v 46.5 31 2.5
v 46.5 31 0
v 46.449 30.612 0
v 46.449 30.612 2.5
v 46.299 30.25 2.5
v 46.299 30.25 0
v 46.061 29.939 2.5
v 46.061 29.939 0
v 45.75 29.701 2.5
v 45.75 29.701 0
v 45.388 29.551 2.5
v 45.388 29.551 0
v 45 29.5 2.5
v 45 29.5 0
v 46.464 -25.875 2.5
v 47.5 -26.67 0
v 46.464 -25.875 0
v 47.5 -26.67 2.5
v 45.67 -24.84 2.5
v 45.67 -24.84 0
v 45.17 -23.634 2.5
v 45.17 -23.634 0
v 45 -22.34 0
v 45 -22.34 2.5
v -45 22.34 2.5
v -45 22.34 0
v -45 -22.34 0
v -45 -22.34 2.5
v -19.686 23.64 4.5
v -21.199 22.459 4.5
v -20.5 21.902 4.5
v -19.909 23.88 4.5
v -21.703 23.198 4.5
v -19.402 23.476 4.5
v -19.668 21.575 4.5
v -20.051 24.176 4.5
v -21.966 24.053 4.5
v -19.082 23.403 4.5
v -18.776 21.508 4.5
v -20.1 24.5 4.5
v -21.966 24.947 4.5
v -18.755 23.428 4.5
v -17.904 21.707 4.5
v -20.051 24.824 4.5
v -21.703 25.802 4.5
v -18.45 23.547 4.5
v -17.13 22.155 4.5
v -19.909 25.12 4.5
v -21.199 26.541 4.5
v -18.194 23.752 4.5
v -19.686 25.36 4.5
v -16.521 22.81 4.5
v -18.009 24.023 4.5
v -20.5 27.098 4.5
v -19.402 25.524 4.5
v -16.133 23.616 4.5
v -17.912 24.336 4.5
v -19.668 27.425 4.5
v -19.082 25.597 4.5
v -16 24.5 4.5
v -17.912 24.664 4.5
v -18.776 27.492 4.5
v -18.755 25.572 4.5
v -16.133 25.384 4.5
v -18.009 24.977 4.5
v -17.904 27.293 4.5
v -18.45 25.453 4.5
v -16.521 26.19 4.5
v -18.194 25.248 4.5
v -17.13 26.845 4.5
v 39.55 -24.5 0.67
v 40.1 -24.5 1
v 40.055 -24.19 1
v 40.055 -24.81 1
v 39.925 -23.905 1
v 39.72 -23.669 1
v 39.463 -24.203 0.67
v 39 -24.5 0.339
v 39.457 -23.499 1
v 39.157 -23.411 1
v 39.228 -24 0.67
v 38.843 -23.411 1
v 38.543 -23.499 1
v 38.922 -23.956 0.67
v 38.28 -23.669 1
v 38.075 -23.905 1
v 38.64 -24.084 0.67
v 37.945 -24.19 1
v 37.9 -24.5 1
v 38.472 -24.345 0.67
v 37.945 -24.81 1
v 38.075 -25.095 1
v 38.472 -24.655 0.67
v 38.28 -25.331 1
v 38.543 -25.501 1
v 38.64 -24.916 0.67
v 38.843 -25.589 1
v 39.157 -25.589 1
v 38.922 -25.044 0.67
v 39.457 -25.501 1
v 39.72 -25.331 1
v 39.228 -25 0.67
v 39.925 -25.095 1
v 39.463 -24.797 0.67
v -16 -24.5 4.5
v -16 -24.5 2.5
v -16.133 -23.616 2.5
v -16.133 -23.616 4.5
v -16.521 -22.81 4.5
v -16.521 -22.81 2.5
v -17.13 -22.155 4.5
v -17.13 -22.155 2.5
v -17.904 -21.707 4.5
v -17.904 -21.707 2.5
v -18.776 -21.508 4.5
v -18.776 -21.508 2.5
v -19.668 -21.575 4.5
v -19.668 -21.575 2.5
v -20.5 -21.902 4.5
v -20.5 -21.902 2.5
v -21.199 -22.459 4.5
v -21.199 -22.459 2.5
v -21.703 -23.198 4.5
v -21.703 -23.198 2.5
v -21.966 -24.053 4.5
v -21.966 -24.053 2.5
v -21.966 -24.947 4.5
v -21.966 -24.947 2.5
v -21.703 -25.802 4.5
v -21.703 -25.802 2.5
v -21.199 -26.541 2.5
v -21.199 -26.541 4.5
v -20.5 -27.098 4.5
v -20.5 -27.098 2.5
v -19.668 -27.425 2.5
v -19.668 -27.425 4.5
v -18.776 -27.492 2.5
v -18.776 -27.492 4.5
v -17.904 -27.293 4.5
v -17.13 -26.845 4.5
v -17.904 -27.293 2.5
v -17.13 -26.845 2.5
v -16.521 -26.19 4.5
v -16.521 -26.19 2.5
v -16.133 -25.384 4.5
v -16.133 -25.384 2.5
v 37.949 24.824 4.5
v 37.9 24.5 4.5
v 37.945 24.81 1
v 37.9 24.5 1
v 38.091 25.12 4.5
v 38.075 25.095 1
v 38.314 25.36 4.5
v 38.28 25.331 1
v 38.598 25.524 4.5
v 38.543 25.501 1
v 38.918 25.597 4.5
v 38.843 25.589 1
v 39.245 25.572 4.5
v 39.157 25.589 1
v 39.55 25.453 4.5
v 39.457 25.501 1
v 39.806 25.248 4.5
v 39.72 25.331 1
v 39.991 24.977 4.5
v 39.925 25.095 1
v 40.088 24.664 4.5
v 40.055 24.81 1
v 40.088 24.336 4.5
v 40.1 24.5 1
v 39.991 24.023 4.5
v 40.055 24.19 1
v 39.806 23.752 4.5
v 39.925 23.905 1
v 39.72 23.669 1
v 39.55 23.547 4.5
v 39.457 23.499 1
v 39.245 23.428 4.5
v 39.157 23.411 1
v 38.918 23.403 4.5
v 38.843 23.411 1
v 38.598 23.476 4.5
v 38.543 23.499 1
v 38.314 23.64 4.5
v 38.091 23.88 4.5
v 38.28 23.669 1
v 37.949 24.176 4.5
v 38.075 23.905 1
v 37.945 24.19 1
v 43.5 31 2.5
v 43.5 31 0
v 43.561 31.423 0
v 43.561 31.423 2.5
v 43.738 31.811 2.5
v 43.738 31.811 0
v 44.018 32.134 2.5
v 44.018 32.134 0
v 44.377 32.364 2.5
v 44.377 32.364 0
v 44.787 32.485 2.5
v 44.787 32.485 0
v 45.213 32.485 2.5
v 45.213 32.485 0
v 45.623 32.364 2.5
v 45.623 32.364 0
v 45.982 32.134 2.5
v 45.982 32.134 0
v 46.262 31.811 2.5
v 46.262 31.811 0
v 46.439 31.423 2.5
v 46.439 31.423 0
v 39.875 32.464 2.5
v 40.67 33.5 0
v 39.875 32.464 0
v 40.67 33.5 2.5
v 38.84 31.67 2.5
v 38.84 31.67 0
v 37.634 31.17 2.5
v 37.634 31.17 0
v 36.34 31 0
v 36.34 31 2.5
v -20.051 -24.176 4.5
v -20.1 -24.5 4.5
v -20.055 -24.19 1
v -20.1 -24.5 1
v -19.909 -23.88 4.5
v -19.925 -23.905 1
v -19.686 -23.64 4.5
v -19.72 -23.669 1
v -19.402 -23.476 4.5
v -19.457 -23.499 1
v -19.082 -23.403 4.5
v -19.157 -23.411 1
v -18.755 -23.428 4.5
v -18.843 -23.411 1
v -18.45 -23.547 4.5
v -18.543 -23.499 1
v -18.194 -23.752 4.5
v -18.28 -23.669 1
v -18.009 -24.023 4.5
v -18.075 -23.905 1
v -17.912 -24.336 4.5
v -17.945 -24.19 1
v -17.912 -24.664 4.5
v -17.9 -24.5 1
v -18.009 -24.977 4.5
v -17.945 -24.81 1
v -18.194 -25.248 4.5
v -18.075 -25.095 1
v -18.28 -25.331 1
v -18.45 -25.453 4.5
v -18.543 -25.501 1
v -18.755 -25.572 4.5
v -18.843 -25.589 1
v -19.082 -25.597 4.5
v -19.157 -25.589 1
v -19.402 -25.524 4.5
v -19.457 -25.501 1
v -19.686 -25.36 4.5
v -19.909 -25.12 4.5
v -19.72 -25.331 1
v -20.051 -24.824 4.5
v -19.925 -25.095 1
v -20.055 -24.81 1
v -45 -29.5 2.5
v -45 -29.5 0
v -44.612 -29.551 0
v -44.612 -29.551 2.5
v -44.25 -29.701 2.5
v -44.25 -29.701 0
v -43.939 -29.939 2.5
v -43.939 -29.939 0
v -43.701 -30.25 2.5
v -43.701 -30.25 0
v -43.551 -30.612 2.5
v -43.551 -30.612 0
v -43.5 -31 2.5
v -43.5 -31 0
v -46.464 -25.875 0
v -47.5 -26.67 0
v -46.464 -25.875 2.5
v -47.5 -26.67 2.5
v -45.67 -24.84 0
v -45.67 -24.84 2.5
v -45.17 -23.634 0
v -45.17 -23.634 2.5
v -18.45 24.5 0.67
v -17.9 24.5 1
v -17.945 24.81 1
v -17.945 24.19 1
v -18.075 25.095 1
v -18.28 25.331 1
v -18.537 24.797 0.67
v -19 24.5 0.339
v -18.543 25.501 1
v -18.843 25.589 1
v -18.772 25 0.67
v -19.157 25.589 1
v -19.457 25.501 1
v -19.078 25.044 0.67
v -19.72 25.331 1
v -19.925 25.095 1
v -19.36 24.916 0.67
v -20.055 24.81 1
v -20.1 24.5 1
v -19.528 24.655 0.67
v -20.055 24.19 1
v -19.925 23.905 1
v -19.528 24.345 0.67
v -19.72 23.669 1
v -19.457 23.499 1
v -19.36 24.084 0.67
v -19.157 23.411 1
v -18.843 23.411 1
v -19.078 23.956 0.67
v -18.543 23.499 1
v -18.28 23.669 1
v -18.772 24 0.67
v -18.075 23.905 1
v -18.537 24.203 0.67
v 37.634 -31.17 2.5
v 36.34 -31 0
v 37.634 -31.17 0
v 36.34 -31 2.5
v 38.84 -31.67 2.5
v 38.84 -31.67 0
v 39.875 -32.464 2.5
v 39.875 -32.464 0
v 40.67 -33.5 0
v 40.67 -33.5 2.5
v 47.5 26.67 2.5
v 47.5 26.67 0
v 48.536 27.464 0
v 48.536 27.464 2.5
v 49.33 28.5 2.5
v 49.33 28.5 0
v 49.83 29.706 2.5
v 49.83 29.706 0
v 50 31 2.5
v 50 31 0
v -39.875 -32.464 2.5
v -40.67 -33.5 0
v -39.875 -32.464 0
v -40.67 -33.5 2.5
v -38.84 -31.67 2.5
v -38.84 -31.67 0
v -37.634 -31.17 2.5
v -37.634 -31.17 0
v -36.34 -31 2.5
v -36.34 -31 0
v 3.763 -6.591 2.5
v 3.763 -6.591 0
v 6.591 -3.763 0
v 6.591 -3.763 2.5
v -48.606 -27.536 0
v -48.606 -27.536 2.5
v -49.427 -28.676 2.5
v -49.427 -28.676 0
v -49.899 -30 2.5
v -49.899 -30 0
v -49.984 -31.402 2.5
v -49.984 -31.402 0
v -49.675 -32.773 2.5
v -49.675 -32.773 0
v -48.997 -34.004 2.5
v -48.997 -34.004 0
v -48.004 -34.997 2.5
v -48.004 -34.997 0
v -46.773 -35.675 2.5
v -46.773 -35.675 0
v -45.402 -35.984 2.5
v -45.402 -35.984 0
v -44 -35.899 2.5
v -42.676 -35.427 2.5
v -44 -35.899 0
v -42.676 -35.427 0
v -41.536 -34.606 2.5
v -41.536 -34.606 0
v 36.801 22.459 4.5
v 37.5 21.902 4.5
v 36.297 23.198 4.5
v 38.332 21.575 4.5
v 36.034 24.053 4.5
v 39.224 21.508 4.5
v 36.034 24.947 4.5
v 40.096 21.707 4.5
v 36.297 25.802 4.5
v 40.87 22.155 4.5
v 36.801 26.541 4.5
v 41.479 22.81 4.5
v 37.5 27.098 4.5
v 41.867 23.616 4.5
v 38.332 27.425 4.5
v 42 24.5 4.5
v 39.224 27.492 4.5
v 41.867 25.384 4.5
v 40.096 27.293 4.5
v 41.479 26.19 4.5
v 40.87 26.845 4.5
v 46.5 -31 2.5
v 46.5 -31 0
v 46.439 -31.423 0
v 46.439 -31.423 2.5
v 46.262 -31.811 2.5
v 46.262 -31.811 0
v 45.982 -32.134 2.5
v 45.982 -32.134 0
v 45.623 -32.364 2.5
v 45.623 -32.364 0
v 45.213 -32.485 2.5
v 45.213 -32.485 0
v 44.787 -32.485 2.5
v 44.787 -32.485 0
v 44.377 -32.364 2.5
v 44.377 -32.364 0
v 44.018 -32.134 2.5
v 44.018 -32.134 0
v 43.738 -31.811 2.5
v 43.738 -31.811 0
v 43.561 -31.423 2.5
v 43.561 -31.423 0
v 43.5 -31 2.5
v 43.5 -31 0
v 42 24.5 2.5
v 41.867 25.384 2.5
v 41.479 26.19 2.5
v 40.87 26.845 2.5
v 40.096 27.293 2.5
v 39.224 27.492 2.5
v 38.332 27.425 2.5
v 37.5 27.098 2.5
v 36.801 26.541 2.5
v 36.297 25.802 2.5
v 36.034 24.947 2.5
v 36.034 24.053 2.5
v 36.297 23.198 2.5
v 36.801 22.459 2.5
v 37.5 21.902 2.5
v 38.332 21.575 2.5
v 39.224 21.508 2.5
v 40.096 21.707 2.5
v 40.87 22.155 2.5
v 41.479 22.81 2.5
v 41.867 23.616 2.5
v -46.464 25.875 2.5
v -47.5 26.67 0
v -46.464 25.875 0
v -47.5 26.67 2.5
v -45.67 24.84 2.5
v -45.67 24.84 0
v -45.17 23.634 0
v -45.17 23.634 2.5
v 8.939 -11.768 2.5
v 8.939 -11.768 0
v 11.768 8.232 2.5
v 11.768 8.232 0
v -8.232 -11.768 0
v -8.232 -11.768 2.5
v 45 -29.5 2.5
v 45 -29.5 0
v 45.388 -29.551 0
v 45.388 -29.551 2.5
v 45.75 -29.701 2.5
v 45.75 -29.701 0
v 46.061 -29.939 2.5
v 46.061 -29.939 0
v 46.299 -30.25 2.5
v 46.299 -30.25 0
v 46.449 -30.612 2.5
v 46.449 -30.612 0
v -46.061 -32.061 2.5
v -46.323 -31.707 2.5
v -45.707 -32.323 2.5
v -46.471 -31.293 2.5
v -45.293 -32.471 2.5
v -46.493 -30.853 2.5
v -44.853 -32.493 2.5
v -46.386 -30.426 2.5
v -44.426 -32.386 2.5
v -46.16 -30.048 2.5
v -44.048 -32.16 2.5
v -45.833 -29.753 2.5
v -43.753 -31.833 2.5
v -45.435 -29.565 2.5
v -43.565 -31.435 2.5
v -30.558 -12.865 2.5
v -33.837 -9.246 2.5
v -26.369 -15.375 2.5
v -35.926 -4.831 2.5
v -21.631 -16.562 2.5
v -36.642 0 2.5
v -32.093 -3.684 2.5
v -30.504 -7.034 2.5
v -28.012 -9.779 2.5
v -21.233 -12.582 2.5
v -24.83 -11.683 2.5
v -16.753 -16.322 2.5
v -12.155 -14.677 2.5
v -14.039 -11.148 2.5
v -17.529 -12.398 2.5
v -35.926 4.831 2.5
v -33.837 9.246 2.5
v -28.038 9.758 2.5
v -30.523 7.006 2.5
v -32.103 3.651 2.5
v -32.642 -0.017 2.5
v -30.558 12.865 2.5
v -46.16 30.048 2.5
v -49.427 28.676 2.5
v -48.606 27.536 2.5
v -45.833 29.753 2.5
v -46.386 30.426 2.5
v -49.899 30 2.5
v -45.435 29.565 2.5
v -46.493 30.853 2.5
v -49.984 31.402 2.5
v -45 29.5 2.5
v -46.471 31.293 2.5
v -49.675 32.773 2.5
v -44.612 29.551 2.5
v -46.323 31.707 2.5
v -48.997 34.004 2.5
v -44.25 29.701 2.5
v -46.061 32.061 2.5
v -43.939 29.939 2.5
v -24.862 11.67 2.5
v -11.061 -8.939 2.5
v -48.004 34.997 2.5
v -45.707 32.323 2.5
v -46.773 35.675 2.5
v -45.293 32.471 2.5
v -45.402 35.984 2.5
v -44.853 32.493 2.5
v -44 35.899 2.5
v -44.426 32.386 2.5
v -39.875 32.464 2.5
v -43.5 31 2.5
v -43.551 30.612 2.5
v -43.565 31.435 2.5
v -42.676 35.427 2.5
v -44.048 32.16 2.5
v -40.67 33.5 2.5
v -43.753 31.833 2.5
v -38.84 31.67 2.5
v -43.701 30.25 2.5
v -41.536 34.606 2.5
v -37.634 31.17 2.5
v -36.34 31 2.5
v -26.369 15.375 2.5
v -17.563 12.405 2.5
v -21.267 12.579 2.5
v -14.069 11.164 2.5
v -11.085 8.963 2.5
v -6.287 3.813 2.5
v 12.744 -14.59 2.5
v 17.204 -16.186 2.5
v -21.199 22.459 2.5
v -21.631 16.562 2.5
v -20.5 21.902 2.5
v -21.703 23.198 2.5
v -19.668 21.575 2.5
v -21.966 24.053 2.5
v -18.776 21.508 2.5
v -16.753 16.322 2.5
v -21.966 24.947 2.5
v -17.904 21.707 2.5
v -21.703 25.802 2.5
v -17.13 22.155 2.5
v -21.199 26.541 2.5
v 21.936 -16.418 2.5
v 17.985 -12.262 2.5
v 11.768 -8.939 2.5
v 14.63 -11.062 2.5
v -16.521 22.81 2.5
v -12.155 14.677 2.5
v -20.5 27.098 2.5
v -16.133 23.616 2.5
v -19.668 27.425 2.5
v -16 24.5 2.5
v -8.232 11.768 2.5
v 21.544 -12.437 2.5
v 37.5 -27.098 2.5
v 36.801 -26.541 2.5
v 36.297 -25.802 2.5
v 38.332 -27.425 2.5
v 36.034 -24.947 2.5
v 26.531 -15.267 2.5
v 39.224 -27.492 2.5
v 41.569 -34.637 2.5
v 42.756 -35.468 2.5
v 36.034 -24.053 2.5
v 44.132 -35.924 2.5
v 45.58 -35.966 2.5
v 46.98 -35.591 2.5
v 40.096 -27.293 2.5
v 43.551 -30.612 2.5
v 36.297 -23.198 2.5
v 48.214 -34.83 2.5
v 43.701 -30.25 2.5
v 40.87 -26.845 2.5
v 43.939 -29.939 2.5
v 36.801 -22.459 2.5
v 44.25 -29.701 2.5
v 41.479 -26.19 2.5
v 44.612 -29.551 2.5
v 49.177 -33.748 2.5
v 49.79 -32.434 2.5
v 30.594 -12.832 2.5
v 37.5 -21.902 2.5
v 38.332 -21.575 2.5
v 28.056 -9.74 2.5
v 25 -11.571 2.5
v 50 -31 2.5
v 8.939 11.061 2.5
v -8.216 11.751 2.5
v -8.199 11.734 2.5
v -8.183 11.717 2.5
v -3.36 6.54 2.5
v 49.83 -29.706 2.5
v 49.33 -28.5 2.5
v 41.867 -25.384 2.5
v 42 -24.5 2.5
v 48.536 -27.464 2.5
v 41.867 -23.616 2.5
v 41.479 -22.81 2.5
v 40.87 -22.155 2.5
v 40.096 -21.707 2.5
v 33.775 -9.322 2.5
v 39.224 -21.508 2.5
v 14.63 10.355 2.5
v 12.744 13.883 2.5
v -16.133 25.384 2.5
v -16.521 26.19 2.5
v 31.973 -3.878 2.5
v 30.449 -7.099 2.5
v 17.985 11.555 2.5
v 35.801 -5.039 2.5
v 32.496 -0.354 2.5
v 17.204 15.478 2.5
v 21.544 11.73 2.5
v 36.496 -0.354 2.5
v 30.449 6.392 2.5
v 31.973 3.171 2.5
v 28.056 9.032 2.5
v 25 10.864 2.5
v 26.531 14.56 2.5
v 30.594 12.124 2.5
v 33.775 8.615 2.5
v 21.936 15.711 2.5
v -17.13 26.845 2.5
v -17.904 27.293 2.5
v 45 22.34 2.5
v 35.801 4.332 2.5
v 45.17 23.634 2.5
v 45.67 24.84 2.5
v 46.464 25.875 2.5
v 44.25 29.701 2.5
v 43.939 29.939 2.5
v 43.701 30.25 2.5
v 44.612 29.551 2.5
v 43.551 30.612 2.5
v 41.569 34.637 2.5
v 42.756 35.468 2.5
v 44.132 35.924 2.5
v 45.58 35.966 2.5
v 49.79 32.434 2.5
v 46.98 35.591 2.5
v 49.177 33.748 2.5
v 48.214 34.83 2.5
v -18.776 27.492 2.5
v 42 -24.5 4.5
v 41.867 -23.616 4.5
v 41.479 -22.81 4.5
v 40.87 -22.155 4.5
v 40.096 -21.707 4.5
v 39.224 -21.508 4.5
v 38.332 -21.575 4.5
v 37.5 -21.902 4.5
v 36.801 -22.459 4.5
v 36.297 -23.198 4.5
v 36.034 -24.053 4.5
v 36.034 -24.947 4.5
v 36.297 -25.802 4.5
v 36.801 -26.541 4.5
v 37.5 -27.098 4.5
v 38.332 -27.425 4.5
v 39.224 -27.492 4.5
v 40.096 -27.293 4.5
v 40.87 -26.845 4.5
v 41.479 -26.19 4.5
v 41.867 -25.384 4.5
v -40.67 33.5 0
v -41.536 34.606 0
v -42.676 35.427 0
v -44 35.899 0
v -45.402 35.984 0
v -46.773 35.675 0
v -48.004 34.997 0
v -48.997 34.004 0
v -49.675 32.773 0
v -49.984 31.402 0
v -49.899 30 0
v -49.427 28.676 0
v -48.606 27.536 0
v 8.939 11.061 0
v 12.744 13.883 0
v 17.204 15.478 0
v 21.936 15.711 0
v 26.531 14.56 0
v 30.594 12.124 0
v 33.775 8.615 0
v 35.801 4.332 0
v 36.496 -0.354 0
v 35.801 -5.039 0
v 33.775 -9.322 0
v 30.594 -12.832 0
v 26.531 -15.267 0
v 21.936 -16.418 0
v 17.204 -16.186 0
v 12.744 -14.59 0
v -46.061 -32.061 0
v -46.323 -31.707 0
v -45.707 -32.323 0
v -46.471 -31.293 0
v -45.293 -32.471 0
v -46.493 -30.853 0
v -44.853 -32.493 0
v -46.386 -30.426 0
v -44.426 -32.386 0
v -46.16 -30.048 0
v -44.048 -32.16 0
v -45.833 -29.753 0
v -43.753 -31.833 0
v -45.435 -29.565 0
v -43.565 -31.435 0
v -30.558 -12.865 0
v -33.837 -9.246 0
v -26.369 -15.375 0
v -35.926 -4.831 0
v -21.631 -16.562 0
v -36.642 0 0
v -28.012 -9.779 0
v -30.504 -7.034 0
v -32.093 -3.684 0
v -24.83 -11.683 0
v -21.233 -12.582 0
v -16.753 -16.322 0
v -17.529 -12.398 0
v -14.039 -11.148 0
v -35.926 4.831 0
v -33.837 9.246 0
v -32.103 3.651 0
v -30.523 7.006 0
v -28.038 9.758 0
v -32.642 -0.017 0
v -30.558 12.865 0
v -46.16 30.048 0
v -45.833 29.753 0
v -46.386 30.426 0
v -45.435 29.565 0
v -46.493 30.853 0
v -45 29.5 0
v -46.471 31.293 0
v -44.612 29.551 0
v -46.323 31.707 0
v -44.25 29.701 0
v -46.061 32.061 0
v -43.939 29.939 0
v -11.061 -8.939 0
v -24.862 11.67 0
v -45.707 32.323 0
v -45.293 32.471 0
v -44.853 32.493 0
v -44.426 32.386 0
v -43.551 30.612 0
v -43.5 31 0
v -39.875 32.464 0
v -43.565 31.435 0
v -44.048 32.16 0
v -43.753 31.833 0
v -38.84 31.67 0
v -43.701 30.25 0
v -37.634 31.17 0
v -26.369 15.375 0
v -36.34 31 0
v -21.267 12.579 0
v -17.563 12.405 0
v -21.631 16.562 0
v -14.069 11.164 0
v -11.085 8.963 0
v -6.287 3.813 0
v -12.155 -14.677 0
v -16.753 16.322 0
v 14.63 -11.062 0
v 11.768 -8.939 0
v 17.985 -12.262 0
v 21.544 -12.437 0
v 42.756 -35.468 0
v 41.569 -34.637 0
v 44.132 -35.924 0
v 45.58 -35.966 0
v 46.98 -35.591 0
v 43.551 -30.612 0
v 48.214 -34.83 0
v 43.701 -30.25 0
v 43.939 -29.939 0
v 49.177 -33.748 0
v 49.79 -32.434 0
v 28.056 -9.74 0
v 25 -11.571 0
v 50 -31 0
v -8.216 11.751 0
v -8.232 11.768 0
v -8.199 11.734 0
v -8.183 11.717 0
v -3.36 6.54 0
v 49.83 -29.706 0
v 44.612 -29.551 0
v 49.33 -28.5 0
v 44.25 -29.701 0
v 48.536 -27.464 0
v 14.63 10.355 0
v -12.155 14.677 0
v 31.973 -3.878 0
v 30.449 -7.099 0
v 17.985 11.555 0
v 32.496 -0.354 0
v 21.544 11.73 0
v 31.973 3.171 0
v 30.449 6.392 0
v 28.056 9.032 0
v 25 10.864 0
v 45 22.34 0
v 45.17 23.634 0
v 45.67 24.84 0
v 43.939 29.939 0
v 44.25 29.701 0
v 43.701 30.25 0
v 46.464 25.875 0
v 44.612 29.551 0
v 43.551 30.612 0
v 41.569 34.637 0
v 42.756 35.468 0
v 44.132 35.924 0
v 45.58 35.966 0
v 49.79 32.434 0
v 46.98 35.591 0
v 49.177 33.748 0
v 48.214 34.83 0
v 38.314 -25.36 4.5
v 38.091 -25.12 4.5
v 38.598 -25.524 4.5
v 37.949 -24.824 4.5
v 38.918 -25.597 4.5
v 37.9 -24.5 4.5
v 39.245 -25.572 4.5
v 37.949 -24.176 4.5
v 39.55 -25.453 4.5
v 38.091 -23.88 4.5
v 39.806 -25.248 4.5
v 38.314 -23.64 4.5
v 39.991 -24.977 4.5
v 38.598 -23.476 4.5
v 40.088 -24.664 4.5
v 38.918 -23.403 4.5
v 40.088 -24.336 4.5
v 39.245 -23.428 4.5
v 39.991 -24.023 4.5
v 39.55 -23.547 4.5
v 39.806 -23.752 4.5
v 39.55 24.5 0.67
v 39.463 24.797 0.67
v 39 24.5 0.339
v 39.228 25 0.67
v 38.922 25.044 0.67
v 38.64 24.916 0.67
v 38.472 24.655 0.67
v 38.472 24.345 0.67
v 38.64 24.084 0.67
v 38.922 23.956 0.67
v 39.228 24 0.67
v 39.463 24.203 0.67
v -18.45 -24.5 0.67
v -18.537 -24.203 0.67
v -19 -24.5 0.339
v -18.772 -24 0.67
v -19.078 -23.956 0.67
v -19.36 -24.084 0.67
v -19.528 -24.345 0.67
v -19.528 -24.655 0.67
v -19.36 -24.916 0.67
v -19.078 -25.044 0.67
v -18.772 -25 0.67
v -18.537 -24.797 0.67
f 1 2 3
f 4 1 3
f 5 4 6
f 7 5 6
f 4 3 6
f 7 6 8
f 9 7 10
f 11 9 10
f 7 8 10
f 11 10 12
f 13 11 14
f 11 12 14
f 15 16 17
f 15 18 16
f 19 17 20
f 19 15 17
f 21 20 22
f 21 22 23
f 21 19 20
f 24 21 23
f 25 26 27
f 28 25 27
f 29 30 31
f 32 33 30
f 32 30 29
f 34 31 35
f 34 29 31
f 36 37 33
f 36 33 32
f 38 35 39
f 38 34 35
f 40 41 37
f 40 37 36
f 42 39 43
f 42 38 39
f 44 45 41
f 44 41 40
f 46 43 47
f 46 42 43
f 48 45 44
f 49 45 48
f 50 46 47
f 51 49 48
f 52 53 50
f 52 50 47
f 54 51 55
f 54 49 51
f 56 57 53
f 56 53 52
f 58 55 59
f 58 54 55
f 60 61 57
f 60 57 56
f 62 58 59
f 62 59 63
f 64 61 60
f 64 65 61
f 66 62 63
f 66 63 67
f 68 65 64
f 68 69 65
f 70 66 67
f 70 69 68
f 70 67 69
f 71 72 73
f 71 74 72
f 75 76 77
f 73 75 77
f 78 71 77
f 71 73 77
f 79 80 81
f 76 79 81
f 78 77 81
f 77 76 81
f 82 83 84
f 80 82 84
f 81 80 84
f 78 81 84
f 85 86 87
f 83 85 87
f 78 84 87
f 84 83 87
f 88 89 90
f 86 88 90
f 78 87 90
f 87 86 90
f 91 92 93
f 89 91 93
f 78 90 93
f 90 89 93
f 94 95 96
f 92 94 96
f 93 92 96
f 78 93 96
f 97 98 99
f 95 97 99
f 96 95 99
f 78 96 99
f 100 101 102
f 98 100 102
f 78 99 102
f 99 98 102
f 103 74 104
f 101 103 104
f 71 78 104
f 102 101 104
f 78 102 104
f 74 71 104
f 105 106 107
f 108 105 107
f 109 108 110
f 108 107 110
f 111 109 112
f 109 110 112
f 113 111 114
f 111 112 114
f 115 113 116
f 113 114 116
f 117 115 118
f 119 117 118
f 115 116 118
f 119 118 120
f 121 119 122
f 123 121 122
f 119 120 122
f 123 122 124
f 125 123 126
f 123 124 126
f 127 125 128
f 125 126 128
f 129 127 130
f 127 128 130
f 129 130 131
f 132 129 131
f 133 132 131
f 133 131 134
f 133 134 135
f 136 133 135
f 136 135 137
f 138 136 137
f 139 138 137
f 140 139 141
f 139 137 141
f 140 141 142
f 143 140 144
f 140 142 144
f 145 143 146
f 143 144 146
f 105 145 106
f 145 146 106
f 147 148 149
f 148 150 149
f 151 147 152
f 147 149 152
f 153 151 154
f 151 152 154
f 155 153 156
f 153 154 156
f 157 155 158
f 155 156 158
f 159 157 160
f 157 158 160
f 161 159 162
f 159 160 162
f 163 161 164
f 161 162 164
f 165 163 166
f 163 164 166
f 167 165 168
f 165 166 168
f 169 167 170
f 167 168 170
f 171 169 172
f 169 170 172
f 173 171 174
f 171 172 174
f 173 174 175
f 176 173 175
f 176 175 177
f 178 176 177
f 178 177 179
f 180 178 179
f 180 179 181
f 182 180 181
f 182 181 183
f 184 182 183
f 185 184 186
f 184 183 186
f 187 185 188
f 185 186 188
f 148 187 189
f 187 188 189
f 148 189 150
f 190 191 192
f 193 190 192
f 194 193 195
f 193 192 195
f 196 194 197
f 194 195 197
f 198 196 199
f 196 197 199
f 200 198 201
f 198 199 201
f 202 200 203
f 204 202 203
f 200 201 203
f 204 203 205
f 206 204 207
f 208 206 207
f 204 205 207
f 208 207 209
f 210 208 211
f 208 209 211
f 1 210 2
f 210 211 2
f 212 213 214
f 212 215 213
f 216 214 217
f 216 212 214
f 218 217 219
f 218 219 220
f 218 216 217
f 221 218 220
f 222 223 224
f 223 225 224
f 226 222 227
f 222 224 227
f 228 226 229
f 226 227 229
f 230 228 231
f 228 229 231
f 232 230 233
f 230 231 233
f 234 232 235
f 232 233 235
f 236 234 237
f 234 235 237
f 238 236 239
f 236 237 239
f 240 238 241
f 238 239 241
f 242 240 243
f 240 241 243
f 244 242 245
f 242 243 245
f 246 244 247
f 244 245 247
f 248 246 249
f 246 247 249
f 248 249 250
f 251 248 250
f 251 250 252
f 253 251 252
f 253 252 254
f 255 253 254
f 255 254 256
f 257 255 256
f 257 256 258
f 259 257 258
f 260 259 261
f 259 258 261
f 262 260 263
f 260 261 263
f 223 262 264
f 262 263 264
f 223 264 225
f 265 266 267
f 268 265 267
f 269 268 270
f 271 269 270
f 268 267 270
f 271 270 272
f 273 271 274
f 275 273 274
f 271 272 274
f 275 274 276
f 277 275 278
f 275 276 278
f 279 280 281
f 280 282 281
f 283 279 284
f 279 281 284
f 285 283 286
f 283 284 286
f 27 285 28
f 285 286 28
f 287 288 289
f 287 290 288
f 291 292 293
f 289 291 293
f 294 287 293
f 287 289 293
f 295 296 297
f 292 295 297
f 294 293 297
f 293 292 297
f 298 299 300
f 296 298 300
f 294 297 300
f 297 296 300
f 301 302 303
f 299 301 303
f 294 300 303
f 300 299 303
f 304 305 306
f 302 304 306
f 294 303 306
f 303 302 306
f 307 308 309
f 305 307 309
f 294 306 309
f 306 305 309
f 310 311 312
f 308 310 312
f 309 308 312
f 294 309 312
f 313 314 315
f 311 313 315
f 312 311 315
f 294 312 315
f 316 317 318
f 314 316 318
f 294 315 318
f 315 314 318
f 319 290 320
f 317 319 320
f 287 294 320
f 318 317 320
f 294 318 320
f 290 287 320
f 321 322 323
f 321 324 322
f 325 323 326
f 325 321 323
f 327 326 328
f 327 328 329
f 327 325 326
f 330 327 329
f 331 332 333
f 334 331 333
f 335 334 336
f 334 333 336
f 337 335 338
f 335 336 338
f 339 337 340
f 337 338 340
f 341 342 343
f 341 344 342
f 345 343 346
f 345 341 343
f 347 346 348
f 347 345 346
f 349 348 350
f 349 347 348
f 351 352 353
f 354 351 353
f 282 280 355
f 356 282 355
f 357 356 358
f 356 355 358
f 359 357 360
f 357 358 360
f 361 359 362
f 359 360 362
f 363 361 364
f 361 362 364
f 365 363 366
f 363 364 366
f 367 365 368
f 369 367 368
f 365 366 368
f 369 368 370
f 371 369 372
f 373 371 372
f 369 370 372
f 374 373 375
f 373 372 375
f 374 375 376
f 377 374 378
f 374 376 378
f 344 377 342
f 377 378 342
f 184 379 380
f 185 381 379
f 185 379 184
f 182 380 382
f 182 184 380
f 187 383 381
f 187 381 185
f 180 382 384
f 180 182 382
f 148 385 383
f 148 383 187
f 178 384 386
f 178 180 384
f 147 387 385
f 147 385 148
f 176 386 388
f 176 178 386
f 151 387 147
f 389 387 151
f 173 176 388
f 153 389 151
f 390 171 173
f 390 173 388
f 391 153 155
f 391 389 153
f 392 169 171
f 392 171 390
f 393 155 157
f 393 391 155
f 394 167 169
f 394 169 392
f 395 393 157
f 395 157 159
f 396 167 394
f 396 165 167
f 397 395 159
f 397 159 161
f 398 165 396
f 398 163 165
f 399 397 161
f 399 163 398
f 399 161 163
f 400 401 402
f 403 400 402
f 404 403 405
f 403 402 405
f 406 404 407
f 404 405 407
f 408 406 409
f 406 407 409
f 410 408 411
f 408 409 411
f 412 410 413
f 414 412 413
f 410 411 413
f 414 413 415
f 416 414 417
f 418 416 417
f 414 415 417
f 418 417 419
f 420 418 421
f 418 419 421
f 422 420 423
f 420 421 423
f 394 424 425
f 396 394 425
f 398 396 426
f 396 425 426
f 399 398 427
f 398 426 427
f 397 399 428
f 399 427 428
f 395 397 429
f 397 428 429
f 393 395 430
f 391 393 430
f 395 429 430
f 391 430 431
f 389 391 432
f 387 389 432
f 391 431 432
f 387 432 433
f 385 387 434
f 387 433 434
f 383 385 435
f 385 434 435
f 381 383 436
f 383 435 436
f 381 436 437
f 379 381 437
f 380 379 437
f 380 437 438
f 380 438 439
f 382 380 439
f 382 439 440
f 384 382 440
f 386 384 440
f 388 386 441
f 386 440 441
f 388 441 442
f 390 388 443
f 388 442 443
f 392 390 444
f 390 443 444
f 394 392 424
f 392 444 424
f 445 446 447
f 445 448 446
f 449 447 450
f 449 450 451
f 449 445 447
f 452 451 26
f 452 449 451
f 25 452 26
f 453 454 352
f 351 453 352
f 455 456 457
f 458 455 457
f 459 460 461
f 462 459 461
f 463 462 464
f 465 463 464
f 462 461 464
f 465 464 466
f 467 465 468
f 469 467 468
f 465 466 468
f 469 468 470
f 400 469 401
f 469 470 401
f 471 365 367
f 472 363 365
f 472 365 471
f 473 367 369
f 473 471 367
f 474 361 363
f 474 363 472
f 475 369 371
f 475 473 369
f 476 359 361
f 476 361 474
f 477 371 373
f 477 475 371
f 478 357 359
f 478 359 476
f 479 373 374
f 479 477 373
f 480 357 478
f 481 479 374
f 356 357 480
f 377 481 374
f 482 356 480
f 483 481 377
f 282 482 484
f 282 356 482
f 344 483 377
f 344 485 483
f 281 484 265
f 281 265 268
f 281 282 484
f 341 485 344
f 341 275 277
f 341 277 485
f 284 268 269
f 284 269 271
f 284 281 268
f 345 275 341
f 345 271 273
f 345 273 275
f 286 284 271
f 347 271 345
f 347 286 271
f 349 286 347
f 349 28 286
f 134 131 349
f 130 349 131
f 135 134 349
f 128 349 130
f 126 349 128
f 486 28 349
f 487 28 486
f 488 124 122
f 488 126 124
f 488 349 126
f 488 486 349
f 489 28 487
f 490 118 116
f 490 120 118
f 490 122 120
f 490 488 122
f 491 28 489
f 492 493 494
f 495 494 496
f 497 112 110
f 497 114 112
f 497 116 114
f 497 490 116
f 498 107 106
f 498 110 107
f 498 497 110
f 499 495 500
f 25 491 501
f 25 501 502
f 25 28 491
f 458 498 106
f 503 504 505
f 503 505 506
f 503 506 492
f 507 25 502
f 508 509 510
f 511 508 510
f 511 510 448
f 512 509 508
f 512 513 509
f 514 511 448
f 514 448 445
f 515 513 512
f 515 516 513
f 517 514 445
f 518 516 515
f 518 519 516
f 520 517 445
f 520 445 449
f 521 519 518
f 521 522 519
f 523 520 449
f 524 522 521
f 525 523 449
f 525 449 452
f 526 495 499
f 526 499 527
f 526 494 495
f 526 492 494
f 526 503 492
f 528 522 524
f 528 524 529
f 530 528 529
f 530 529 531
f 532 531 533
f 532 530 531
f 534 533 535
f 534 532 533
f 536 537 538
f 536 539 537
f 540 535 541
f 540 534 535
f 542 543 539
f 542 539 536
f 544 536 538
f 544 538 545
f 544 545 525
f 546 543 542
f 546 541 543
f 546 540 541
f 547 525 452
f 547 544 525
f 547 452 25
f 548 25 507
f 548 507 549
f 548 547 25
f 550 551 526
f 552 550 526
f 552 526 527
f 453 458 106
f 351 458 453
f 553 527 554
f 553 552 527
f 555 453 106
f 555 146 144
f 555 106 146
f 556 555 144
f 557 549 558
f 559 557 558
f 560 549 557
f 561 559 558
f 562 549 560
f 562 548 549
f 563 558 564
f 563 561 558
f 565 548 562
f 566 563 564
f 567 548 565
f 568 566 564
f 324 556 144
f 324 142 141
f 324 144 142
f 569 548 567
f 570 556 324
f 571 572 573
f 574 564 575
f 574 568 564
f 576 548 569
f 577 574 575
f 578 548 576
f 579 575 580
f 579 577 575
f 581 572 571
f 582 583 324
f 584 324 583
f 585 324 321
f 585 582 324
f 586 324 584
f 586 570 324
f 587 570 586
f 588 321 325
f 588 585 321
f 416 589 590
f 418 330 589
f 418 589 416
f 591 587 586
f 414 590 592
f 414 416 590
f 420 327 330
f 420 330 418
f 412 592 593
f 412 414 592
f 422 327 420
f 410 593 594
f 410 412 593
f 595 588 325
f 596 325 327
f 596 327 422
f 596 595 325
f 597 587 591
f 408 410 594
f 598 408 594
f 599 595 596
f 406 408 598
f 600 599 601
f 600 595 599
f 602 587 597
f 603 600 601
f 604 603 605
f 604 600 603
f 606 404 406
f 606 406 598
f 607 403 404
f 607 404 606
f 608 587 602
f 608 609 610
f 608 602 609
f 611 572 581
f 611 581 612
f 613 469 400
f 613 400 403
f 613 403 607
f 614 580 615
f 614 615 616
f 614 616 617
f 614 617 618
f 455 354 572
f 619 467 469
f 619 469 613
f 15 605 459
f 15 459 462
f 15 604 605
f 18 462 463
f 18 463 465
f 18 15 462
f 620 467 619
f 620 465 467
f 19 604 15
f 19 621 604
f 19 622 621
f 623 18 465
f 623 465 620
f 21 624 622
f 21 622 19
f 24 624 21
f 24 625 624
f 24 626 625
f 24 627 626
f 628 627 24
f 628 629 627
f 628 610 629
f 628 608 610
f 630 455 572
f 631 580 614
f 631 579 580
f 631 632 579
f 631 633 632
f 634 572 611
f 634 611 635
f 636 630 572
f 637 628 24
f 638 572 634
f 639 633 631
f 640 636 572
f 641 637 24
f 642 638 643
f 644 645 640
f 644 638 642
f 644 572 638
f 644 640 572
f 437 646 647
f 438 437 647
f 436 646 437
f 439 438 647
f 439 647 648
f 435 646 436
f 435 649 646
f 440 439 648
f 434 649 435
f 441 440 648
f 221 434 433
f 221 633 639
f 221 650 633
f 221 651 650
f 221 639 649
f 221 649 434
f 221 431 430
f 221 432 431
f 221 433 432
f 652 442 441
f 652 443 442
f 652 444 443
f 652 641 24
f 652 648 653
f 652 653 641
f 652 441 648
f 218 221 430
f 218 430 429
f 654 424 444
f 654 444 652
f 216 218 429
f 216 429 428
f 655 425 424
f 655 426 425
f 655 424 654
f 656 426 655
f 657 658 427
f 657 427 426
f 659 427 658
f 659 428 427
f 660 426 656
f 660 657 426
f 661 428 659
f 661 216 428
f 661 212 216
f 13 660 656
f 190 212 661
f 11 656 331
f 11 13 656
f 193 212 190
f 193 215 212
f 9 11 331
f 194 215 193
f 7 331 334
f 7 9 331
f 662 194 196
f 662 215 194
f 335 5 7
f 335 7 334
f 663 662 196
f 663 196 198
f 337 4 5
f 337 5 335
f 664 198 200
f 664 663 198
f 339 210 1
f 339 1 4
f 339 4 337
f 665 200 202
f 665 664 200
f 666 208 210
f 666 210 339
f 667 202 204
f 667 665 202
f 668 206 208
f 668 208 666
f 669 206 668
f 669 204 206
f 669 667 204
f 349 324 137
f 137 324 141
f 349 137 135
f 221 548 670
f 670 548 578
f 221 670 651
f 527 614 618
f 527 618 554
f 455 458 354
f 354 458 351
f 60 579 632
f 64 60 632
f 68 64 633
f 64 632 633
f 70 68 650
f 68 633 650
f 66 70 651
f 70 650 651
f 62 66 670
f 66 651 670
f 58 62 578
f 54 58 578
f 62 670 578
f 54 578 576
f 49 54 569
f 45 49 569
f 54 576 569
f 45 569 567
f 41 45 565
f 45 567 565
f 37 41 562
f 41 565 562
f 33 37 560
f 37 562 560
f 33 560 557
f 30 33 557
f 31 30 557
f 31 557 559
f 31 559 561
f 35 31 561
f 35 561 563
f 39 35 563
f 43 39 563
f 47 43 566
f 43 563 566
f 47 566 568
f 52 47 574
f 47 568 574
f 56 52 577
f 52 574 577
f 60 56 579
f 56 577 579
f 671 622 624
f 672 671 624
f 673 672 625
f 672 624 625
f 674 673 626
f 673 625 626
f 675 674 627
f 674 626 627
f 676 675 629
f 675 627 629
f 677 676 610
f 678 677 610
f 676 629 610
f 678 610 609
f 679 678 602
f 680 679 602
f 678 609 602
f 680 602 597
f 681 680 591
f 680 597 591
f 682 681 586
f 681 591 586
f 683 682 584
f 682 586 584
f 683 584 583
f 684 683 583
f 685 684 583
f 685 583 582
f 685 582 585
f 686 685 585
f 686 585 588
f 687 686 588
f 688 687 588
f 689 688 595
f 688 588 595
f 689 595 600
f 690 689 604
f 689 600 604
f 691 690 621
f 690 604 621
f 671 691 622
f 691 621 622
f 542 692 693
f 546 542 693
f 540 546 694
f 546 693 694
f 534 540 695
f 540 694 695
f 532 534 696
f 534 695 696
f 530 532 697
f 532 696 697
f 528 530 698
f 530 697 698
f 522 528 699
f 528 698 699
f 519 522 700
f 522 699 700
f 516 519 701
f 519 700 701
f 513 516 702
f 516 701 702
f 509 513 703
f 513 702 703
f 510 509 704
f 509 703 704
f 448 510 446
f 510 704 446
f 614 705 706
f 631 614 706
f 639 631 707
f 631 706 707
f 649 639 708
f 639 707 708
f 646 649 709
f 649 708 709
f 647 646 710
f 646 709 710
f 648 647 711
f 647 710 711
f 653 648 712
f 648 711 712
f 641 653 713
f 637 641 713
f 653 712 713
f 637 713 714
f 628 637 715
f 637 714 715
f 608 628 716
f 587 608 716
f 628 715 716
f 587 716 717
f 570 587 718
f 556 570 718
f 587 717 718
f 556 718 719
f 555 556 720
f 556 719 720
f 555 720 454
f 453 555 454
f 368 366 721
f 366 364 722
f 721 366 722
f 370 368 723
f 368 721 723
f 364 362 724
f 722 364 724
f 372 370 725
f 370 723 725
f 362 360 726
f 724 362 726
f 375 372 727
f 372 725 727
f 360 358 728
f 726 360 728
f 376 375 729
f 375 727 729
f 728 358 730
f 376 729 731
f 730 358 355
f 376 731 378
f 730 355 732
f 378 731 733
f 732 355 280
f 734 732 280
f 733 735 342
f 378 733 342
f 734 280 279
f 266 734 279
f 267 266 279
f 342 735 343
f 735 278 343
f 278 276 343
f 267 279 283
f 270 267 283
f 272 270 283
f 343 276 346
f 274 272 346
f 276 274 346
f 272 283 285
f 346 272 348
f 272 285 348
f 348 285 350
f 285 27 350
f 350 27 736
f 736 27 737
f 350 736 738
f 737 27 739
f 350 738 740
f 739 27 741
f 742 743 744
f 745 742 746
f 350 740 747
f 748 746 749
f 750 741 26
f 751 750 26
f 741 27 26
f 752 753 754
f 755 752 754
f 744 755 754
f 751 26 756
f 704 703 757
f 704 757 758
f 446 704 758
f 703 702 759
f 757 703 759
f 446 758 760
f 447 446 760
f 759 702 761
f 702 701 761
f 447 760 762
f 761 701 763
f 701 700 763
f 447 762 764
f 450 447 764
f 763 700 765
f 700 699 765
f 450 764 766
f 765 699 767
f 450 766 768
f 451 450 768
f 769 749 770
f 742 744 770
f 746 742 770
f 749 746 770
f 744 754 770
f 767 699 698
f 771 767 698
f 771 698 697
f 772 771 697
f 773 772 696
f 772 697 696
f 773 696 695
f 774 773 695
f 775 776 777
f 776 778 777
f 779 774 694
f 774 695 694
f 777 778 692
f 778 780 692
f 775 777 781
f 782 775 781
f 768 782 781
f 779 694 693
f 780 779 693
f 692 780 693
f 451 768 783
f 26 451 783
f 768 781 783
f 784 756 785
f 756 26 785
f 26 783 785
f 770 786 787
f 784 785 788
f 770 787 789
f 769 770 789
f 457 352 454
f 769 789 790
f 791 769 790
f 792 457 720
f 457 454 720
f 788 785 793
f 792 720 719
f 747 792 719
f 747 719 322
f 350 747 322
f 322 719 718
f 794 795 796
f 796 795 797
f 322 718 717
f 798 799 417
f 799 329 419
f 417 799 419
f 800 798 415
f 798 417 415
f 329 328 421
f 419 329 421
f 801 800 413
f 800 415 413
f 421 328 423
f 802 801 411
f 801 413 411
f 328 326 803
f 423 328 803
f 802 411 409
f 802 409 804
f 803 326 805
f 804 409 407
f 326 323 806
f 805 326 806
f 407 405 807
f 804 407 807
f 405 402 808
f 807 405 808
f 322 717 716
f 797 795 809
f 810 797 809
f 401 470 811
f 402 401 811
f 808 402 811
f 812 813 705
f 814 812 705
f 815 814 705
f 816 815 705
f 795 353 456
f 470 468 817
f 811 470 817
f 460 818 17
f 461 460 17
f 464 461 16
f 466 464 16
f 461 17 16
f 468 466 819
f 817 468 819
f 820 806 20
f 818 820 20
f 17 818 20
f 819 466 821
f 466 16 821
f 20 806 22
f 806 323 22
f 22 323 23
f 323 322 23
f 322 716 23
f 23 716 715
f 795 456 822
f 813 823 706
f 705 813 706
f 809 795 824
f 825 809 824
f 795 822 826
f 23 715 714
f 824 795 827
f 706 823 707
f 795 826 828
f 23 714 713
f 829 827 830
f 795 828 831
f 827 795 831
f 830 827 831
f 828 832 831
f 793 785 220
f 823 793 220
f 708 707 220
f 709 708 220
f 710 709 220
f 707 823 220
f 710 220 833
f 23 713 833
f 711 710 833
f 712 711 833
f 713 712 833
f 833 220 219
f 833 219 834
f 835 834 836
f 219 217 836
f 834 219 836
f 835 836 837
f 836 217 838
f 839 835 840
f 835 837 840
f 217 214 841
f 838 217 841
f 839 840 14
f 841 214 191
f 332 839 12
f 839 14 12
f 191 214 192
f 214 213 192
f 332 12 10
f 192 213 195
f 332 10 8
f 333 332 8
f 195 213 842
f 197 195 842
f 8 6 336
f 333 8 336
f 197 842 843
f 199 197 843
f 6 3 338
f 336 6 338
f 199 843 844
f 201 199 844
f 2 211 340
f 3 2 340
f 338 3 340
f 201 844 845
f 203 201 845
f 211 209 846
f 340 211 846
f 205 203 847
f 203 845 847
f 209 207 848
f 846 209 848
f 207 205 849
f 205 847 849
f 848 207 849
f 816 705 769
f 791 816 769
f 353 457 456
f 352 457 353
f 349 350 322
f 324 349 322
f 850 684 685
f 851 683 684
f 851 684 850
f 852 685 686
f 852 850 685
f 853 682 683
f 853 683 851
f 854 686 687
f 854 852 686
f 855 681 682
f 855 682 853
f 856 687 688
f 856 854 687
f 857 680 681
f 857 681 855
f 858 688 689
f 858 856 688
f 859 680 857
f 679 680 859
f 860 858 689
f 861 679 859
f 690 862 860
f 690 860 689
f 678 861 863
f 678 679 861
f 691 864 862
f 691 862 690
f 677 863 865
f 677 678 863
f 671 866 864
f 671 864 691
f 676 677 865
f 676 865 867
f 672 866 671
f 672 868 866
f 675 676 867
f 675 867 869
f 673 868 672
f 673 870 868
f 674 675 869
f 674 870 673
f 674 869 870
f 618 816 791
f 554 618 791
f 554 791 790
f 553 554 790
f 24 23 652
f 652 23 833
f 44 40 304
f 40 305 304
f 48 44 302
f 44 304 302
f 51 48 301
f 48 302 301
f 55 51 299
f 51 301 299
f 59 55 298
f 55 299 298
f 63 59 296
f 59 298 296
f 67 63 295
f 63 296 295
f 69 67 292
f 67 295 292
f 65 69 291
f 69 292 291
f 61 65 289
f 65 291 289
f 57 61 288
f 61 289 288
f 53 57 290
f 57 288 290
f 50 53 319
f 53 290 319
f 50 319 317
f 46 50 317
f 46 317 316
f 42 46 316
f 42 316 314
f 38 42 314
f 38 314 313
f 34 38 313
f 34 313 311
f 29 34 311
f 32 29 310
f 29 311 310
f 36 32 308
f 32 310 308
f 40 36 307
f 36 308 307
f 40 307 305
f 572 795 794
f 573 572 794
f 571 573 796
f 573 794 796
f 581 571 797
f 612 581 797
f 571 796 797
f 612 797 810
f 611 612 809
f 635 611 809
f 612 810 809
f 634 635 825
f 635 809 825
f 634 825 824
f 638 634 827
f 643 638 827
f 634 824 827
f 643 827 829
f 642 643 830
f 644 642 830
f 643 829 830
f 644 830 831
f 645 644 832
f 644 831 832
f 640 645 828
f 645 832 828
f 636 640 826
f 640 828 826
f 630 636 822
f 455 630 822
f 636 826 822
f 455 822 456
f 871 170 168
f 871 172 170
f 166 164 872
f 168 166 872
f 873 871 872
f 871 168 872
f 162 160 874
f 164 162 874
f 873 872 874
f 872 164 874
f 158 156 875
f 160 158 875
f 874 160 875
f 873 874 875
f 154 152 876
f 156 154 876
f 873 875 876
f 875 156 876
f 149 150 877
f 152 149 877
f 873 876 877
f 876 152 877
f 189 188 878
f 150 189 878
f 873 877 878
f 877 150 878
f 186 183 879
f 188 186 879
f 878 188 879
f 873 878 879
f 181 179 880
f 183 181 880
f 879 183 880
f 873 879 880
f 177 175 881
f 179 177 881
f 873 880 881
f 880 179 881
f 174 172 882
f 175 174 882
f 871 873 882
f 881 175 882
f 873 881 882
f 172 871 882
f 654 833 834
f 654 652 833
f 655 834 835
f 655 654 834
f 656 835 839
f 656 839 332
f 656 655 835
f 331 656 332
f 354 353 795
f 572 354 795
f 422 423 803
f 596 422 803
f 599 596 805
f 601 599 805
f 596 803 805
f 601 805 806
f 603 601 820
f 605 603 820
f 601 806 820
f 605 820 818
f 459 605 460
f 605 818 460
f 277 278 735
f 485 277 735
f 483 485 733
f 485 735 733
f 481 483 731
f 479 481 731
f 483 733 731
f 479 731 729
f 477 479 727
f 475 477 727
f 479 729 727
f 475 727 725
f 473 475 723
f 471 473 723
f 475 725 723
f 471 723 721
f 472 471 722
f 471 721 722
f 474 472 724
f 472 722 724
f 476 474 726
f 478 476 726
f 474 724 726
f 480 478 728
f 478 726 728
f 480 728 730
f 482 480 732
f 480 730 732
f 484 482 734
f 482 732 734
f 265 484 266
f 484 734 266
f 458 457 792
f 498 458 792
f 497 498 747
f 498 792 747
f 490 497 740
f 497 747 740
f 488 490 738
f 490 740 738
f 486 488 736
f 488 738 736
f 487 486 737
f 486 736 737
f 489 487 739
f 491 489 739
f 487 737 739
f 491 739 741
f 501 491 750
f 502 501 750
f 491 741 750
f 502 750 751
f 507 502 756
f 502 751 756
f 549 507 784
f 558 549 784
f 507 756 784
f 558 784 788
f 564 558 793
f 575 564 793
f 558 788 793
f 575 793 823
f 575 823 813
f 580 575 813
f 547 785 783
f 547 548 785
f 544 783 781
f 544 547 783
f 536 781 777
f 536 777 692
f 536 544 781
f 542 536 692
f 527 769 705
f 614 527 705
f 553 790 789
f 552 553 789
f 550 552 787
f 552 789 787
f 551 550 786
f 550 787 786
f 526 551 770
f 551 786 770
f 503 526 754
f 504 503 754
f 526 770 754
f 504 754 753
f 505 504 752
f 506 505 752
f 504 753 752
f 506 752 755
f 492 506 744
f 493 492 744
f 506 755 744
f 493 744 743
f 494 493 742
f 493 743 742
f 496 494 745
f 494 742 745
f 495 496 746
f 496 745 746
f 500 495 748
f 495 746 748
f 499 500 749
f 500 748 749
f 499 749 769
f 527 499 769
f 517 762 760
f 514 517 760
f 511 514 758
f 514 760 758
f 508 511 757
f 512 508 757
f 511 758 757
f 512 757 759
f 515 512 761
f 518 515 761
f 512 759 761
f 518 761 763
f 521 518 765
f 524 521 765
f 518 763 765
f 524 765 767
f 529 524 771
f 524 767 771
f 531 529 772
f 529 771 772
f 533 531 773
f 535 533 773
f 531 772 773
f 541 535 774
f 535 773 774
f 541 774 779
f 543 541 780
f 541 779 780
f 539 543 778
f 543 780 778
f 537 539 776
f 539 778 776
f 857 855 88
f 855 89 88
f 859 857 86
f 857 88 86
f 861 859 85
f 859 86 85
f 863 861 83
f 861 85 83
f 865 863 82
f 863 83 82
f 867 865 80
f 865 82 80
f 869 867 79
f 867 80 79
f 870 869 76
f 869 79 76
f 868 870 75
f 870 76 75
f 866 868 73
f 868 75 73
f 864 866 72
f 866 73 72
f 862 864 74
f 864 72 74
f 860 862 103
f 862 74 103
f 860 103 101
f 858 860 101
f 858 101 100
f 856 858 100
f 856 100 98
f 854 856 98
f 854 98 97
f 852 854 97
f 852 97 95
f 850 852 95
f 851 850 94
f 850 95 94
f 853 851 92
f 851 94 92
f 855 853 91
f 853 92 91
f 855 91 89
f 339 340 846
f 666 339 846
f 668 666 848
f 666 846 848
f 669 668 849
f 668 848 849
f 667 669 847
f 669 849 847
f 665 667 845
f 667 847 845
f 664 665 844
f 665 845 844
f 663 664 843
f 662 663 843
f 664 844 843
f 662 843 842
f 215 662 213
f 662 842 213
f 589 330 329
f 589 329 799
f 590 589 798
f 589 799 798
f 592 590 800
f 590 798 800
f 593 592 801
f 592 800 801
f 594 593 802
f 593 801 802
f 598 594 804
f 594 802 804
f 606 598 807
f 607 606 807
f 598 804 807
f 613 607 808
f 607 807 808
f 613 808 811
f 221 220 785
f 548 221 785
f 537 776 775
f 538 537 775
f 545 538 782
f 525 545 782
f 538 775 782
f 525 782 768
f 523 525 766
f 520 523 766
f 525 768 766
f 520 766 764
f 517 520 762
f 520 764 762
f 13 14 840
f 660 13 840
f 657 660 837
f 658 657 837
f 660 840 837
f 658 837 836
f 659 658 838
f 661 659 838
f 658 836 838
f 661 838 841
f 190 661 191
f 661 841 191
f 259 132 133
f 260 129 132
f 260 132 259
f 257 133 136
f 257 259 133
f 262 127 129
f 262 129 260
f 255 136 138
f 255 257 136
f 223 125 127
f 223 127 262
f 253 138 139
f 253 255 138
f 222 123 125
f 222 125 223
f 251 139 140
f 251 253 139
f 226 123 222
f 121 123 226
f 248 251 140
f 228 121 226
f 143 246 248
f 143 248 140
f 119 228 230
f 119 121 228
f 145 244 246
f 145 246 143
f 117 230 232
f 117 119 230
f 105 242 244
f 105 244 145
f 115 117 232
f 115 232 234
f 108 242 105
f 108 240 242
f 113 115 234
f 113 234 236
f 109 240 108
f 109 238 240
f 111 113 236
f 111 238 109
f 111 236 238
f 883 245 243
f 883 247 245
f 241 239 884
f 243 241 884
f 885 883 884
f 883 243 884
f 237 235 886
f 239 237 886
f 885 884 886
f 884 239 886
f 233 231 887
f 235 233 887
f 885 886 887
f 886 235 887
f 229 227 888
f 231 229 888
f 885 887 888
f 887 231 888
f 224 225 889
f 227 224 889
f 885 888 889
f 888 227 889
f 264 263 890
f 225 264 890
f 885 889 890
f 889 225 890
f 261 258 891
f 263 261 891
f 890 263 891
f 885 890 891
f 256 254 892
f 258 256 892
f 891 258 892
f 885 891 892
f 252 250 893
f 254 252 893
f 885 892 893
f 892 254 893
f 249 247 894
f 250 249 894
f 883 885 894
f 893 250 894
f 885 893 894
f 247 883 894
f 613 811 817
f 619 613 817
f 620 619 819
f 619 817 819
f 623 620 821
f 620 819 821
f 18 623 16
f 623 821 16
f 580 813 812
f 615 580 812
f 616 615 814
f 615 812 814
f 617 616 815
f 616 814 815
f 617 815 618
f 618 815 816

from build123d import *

# Parameters (mm, degrees)
F1_DEPTH = 2.5
F2_R     = 5
F3_R     = 3
F4_DEPTH = 2
F6_D     = 2.2
F6_DEPTH = 3.5
F6_TIP   = 0.6609466809


with BuildPart() as f1:
    # F0 (on Top) → F1 (new body)
    with BuildSketch(Plane.XY):
        with BuildLine():
            ThreePointArc((-45, -26), (-48.5355339059, -34.5355339059), (-40, -31))
            Line((-40, -31), (-43.5, -31))
            ThreePointArc((-43.5, -31), (-46.0606601718, -32.0606601718), (-45, -29.5))
            Line((-45, -29.5), (-45, -26))
        make_face()
        with BuildLine():
            ThreePointArc((-45, -26), (-41.4644660941, -27.4644660941), (-40, -31))
            Line((-40, -31), (40, -31))
            ThreePointArc((40, -31), (41.4644660941, -27.4644660941), (45, -26))
            Line((45, -26), (45, 26))
            ThreePointArc((45, 26), (41.4644660941, 27.4644660941), (40, 31))
            Line((40, 31), (-40, 31))
            ThreePointArc((-40, 31), (-41.4644660941, 27.4644660941), (-45, 26))
            Line((-45, 26), (-45, -26))
        make_face()
        with BuildLine():
            Line((-11.0606601718, -8.9393398282), (8.9393398282, 11.0606601718))
            ThreePointArc((8.9393398282, 11.0606601718), (36.4956890143, -0.3535533906), (8.9393398282, -11.767766953))
            Line((8.9393398282, -11.767766953), (3.7625631329, -6.5909902577))
            Line((3.7625631329, -6.5909902577), (5.1767766953, -5.1767766953))
            Line((5.1767766953, -5.1767766953), (6.5909902577, -3.7625631329))
            Line((6.5909902577, -3.7625631329), (11.767766953, -8.9393398282))
            ThreePointArc((11.767766953, -8.9393398282), (32.4956890143, -0.3535533906), (11.767766953, 8.232233047))
            Line((11.767766953, 8.232233047), (-8.232233047, -11.767766953))
            ThreePointArc((-8.232233047, -11.767766953), (-36.6421356237, 0), (-8.232233047, 11.767766953))
            ThreePointArc((-8.232233047, 11.767766953), (-8.2074655375, 11.7425578811), (-8.1831473235, 11.716915118))
            Line((-8.1831473235, 11.716915118), (-3.3599240188, 6.5401384227))
            Line((-3.3599240188, 6.5401384227), (-4.8232233047, 5.1767766953))
            Line((-4.8232233047, 5.1767766953), (-6.2865225906, 3.8134149679))
            Line((-6.2865225906, 3.8134149679), (-11.0847678218, 8.9633826393))
            ThreePointArc((-11.0847678218, 8.9633826393), (-32.6421241617, -0.0170237742), (-11.0606601718, -8.9393398282))
        make_face(mode=Mode.SUBTRACT)
        with BuildLine():
            Line((-43.5, -31), (-40, -31))
            ThreePointArc((-40, -31), (-41.4644660941, -27.4644660941), (-45, -26))
            Line((-45, -26), (-45, -29.5))
            ThreePointArc((-45, -29.5), (-43.9393398282, -29.9393398282), (-43.5, -31))
        make_face()
        with BuildLine():
            ThreePointArc((45, -26), (41.4644660941, -27.4644660941), (40, -31))
            Line((40, -31), (43.5, -31))
            ThreePointArc((43.5, -31), (43.9393398282, -29.9393398282), (45, -29.5))
            Line((45, -29.5), (45, -26))
        make_face()
        with BuildLine():
            Line((43.5, -31), (40, -31))
            ThreePointArc((40, -31), (45, -36), (50, -31))
            ThreePointArc((50, -31), (48.5355339059, -27.4644660941), (45, -26))
            Line((45, -26), (45, -29.5))
            ThreePointArc((45, -29.5), (46.0606601718, -29.9393398282), (46.5, -31))
            ThreePointArc((46.5, -31), (45, -32.5), (43.5, -31))
        make_face()
        with BuildLine():
            ThreePointArc((-40, 31), (-48.5355339059, 34.5355339059), (-45, 26))
            Line((-45, 26), (-45, 29.5))
            ThreePointArc((-45, 29.5), (-46.0606601718, 32.0606601718), (-43.5, 31))
            Line((-43.5, 31), (-40, 31))
        make_face()
        with BuildLine():
            Line((-45, 29.5), (-45, 26))
            ThreePointArc((-45, 26), (-41.4644660941, 27.4644660941), (-40, 31))
            Line((-40, 31), (-43.5, 31))
            ThreePointArc((-43.5, 31), (-43.9393398282, 29.9393398282), (-45, 29.5))
        make_face()
        with BuildLine():
            ThreePointArc((40, 31), (41.4644660941, 27.4644660941), (45, 26))
            Line((45, 26), (45, 29.5))
            ThreePointArc((45, 29.5), (43.9393398282, 29.9393398282), (43.5, 31))
            Line((43.5, 31), (40, 31))
        make_face()
        with BuildLine():
            Line((45, 29.5), (45, 26))
            ThreePointArc((45, 26), (48.5355339059, 27.4644660941), (50, 31))
            ThreePointArc((50, 31), (45, 36), (40, 31))
            Line((40, 31), (43.5, 31))
            ThreePointArc((43.5, 31), (45, 32.5), (46.5, 31))
            ThreePointArc((46.5, 31), (46.0606601718, 29.9393398282), (45, 29.5))
        make_face()
    extrude(amount=F1_DEPTH)

    # F2
    f2_edges = [f1.edges().sort_by_distance(p)[0] for p in [
        (-40, -31, 1.25),
        (45, 26, 1.25),
        (40, -31, 1.25),
        (-45, -26, 1.25),
        (-45, 26, 1.25),
        (-40, 31, 1.25),
        (40, 31, 1.25),
        (45, -26, 1.25),
    ]]
    fillet(f2_edges, radius=F2_R)

    # F3 (on face) → F4 (join)
    with BuildSketch(Plane.XY.offset(2.5)):
        with Locations((-19, -24.5)):
            Circle(F3_R)
        with Locations((39, -24.5)):
            Circle(F3_R)
        with Locations((39, 24.5)):
            Circle(F3_R)
        with Locations((-19, 24.5)):
            Circle(F3_R)
    extrude(amount=F4_DEPTH)

    # F6
    with Locations(Plane.XY.offset(4.5)):
        with Locations((-19, 24.5), (39, 24.5), (39, -24.5), (-19, -24.5)):
            Hole(F6_D / 2, depth=F6_DEPTH)
            with Locations((0, 0, -(F6_DEPTH + F6_TIP / 2))):  # 118° drill point
                Cone(0, F6_D / 2, F6_TIP, mode=Mode.SUBTRACT)


solid = f1.part
